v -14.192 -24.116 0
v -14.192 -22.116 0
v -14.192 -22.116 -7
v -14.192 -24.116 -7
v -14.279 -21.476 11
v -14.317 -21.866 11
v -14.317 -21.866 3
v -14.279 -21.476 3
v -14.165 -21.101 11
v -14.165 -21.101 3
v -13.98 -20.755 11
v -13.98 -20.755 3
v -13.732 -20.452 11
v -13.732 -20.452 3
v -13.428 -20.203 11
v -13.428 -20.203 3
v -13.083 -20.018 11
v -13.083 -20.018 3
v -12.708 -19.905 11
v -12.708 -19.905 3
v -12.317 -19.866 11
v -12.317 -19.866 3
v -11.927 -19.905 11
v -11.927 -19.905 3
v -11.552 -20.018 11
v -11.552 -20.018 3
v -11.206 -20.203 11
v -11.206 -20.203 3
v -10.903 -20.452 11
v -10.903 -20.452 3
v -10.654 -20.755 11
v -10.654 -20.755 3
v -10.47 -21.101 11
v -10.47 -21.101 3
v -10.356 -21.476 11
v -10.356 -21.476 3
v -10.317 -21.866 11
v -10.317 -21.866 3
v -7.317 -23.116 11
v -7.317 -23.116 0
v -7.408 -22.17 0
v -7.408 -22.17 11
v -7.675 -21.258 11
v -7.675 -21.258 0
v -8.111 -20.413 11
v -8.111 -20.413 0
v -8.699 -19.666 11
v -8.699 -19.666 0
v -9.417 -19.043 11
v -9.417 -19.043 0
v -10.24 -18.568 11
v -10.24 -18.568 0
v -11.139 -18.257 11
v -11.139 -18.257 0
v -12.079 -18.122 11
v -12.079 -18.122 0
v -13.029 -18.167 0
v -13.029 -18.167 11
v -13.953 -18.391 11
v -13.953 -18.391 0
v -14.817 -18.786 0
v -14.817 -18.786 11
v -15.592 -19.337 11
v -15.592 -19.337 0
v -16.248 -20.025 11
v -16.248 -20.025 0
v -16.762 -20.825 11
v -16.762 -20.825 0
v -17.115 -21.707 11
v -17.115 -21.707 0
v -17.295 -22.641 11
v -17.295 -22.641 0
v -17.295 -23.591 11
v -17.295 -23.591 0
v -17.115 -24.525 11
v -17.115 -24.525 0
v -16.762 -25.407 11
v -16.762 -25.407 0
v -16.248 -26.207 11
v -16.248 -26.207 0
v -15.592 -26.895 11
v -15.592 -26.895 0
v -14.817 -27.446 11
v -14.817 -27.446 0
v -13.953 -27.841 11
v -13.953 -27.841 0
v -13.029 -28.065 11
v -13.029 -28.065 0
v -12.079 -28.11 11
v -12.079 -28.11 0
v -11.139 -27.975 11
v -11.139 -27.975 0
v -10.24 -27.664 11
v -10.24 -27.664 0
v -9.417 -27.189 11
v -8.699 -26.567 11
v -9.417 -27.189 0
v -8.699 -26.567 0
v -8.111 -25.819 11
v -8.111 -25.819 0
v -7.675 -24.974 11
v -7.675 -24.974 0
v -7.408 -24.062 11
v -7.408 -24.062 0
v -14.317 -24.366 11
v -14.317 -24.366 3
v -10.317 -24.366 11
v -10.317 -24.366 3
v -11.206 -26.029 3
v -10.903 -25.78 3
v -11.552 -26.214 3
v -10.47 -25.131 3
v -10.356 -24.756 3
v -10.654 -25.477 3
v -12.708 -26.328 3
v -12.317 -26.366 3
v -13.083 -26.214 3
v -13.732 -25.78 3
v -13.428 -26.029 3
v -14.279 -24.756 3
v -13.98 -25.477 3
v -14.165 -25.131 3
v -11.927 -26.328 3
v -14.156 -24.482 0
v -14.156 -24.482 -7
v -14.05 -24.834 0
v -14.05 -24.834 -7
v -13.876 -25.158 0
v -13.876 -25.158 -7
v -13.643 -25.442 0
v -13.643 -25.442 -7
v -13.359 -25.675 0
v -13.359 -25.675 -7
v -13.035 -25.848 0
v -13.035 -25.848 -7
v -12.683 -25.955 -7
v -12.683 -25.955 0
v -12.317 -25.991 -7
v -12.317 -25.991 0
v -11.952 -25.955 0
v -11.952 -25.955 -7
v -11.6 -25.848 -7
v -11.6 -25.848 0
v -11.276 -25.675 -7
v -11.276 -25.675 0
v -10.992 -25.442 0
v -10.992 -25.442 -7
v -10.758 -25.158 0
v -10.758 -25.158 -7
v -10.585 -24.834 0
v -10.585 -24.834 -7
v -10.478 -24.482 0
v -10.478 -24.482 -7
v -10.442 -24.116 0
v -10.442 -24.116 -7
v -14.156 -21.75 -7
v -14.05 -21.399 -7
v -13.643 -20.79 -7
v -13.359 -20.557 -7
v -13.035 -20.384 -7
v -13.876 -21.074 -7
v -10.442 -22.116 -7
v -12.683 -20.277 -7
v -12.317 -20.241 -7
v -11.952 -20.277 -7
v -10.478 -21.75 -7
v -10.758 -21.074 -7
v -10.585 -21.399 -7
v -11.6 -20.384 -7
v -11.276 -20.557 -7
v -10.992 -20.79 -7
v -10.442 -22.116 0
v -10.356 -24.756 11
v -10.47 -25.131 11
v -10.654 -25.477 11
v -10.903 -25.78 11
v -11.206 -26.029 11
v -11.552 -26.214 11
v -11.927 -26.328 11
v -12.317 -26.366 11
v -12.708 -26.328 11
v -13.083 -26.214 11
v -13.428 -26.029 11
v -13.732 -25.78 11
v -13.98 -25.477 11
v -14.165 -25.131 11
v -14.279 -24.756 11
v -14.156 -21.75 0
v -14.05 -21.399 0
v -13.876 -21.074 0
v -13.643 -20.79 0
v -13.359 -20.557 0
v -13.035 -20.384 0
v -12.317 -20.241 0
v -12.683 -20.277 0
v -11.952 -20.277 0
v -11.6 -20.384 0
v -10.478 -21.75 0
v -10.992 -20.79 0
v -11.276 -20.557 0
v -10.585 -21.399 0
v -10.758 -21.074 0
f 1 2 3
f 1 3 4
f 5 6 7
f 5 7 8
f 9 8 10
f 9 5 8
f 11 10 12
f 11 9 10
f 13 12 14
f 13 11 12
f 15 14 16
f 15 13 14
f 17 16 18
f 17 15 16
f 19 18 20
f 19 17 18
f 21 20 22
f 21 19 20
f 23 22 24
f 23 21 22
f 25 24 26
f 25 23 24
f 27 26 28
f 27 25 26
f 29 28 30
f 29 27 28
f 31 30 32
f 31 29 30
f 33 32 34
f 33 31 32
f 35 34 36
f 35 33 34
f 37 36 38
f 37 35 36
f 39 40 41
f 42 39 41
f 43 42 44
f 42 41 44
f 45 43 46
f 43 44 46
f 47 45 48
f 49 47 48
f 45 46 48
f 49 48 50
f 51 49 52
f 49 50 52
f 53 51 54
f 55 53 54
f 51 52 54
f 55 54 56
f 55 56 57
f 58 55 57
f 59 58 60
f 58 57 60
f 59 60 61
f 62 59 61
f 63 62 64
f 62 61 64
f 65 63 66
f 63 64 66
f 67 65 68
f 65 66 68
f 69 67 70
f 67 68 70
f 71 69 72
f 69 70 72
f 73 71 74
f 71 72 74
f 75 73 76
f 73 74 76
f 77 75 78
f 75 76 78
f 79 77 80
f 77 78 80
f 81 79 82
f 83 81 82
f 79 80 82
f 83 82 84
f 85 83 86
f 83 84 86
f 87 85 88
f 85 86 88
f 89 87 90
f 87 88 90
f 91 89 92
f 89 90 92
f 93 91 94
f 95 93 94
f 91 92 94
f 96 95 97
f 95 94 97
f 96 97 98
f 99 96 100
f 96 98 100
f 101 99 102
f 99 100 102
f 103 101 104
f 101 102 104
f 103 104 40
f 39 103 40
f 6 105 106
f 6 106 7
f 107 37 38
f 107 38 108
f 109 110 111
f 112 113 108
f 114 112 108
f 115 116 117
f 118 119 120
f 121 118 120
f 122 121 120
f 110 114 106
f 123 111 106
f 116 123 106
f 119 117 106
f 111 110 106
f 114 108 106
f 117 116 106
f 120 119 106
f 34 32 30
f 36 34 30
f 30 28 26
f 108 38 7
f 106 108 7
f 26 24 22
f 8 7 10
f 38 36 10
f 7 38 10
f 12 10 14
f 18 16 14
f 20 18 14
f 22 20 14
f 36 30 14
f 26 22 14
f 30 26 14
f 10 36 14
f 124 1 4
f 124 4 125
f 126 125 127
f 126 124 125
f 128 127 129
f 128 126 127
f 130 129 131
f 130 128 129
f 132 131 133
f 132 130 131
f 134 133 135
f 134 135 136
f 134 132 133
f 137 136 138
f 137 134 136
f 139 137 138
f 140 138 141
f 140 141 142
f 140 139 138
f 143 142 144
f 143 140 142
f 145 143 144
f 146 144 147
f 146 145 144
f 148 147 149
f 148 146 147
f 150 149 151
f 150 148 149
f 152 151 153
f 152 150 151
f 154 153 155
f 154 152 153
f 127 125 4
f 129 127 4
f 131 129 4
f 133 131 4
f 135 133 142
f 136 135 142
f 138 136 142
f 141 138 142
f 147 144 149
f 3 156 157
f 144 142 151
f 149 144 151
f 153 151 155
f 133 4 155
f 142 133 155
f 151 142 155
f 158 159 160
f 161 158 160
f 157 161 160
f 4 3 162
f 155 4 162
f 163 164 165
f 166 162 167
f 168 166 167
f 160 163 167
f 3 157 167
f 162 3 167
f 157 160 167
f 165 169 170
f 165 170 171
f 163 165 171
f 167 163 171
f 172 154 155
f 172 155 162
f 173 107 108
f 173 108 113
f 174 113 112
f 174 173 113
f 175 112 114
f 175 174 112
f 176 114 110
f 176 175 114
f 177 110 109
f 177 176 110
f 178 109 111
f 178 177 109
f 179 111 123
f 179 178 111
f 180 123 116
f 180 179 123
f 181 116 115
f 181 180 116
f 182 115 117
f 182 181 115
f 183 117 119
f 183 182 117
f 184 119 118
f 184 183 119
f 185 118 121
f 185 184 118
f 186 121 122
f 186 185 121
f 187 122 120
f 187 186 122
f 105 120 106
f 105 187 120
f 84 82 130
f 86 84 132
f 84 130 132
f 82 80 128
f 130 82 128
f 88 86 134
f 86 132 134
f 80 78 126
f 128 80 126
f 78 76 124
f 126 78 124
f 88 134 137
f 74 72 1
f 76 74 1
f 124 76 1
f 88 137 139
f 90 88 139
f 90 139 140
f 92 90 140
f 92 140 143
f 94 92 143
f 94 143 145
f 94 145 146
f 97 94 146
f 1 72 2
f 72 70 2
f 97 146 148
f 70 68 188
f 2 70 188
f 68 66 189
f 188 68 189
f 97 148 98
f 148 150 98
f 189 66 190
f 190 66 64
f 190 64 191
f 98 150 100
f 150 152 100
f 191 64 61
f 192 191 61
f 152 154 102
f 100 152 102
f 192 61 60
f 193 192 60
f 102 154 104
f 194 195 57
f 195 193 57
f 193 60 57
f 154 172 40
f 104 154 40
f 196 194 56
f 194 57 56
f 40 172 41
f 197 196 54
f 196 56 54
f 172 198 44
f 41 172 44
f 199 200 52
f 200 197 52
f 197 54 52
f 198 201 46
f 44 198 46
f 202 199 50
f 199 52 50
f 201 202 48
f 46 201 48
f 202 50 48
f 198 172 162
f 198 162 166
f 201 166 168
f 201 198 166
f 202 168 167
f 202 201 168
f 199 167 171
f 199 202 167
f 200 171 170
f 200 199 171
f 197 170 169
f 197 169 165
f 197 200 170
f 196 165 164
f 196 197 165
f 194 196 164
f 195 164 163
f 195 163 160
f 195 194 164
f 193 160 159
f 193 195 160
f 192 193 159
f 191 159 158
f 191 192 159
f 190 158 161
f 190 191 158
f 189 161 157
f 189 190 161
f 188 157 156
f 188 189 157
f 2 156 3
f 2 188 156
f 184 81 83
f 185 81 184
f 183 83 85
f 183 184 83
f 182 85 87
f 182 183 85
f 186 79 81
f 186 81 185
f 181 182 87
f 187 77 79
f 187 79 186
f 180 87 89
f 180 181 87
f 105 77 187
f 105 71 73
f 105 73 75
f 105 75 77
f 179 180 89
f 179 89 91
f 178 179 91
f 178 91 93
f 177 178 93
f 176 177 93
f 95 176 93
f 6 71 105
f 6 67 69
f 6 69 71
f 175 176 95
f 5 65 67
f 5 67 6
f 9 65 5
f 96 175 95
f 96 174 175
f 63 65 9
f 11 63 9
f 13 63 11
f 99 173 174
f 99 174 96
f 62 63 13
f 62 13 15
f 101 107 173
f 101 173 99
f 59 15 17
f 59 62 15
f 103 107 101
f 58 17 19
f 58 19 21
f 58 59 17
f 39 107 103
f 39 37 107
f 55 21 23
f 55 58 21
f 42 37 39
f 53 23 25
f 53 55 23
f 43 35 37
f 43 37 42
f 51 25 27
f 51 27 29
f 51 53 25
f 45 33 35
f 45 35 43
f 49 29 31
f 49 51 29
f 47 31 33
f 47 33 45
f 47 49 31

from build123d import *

# Parameters (mm, degrees)
SKETCH1_R           = 5
BOSS_EXTRUDE1_DEPTH = 11
CUT_EXTRUDE1_DEPTH  = 8
BOSS_EXTRUDE2_DEPTH = 7


with BuildPart() as part:
    # Sketch1 → Boss-Extrude1 (new body)
    with BuildSketch(Plane.XY):
        with Locations((-12.317334514, -23.116112266)):
            Circle(SKETCH1_R)
    extrude(amount=BOSS_EXTRUDE1_DEPTH)

    # Sketch2 → Cut-Extrude1 (cut)
    with BuildSketch(Plane.XY.offset(11)):
        with BuildLine():
            Line((-14.317334514, -24.366112266), (-14.317334514, -21.866112266))
            ThreePointArc((-14.317334514, -21.866112266), (-12.317334514, -19.866112266), (-10.317334514, -21.866112266))
            Line((-10.317334514, -21.866112266), (-10.317334514, -24.366112266))
            ThreePointArc((-10.317334514, -24.366112266), (-12.317334514, -26.366112266), (-14.317334514, -24.366112266))
        make_face()
    extrude(amount=-CUT_EXTRUDE1_DEPTH, mode=Mode.SUBTRACT)

    # Sketch4 → Boss-Extrude2 (add)
    with BuildSketch(Plane(origin=(0, 0, 0), x_dir=(-1, 0, 0), z_dir=(0, 0, -1))):
        with BuildLine():
            Line((10.442334514, -24.116112266), (10.442334514, -22.116112266))
            ThreePointArc((10.442334514, -22.116112266), (12.317334514, -20.241112266), (14.192334514, -22.116112266))
            Line((14.192334514, -22.116112266), (14.192334514, -24.116112266))
            ThreePointArc((14.192334514, -24.116112266), (12.317334514, -25.991112266), (10.442334514, -24.116112266))
        make_face()
    extrude(amount=BOSS_EXTRUDE2_DEPTH)


solid = part.part
